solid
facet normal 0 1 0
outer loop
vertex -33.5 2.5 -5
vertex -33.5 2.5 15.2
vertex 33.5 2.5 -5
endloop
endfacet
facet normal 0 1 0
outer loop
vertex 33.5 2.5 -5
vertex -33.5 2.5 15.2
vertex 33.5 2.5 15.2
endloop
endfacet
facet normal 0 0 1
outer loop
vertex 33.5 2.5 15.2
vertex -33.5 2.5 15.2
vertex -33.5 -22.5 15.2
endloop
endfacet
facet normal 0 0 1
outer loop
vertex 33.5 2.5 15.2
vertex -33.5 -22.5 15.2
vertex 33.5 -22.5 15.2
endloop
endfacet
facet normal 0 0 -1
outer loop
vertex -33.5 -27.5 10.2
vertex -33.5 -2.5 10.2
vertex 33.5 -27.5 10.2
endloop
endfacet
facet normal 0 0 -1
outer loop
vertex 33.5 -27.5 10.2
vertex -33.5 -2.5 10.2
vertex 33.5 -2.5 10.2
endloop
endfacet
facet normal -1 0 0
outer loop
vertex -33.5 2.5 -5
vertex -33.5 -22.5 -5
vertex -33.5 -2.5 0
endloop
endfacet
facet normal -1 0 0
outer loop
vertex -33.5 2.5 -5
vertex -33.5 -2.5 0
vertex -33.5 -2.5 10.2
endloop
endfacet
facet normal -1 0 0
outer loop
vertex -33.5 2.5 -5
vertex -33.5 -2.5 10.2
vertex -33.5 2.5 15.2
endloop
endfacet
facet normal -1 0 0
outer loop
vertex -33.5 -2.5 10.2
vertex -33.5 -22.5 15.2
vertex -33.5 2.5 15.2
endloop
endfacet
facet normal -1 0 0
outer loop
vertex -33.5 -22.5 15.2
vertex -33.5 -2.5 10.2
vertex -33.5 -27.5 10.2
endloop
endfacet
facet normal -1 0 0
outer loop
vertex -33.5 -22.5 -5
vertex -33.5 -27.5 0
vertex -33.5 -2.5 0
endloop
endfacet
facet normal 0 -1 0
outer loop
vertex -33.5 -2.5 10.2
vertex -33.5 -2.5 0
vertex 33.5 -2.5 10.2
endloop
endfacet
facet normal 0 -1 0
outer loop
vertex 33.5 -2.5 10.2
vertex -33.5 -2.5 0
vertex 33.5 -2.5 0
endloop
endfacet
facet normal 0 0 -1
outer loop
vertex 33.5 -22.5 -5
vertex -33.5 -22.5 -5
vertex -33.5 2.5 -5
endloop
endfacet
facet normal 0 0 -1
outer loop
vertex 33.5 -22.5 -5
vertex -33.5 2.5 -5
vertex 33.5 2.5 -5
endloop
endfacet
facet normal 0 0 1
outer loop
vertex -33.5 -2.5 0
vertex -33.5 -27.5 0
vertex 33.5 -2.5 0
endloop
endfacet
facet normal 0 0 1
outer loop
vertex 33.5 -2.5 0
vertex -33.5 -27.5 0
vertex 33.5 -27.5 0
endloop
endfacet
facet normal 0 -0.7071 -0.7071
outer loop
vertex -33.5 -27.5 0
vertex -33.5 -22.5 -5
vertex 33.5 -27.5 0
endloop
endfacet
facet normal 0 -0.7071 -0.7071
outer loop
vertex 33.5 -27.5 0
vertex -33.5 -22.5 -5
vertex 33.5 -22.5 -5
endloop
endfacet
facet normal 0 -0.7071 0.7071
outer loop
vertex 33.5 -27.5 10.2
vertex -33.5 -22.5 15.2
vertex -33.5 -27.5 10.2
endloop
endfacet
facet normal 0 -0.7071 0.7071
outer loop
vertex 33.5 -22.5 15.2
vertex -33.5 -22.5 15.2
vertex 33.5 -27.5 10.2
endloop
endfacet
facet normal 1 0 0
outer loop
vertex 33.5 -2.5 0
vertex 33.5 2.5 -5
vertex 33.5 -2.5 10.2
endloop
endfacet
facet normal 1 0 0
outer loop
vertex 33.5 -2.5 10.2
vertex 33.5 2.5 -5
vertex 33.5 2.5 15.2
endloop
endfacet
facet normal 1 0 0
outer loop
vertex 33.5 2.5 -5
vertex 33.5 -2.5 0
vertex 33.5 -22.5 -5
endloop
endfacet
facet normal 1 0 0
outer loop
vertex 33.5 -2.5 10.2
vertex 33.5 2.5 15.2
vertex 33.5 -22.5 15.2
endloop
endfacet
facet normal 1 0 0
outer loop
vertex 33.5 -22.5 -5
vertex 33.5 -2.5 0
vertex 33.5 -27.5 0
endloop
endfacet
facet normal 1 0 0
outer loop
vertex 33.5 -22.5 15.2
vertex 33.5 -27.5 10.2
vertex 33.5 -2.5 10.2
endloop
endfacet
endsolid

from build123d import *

# Parameters (mm, degrees)
F0_W     = 67
F0_H     = 5
F1_DEPTH = 10.2
F2_W     = 67
F2_H     = 25
F2_H_2   = 5
F3_DEPTH = 5
F4_SIZE  = 4.99999
F5_W     = 67
F5_H     = 5
F5_H_2   = 25
F6_DEPTH = 5
F7_SIZE  = 4.99999


# Not quite as in the source:
# - a fillet or chamfer is up to 0.001 mm smaller than in the source, because OpenCascade refuses the exact size


with BuildPart() as f1:
    # F0 (on Top) → F1 (new body)
    with BuildSketch(Plane.XY):
        Rectangle(F0_W, F0_H)
    extrude(amount=F1_DEPTH)

    # F2 (on face) → F3 (join)
    with BuildSketch(Plane.XY.offset(10.2)):
        with Locations((0, -15)):
            Rectangle(F2_W, F2_H)
        Rectangle(F2_W, F2_H_2)
    extrude(amount=F3_DEPTH)

    # F4 (size 5 in the source; OpenCascade refuses exactly that, so slightly less here)
    f4_edges = [f1.edges().sort_by_distance(p)[0] for p in [
        (0, -27.5, 15.2),
    ]]
    chamfer(f4_edges, length=F4_SIZE)

    # F5 (on face) → F6 (join)
    with BuildSketch(Plane(origin=(0, 0, 0), x_dir=(1, 0, 0), z_dir=(0, 0, -1))):
        Rectangle(F5_W, F5_H)
        with Locations((0, 15)):
            Rectangle(F5_W, F5_H_2)
    extrude(amount=F6_DEPTH)

    # F7 (size 5 in the source; OpenCascade refuses exactly that, so slightly less here)
    f7_edges = [f1.edges().sort_by_distance(p)[0] for p in [
        (0, -27.5, -5),
    ]]
    chamfer(f7_edges, length=F7_SIZE)


solid = f1.part
